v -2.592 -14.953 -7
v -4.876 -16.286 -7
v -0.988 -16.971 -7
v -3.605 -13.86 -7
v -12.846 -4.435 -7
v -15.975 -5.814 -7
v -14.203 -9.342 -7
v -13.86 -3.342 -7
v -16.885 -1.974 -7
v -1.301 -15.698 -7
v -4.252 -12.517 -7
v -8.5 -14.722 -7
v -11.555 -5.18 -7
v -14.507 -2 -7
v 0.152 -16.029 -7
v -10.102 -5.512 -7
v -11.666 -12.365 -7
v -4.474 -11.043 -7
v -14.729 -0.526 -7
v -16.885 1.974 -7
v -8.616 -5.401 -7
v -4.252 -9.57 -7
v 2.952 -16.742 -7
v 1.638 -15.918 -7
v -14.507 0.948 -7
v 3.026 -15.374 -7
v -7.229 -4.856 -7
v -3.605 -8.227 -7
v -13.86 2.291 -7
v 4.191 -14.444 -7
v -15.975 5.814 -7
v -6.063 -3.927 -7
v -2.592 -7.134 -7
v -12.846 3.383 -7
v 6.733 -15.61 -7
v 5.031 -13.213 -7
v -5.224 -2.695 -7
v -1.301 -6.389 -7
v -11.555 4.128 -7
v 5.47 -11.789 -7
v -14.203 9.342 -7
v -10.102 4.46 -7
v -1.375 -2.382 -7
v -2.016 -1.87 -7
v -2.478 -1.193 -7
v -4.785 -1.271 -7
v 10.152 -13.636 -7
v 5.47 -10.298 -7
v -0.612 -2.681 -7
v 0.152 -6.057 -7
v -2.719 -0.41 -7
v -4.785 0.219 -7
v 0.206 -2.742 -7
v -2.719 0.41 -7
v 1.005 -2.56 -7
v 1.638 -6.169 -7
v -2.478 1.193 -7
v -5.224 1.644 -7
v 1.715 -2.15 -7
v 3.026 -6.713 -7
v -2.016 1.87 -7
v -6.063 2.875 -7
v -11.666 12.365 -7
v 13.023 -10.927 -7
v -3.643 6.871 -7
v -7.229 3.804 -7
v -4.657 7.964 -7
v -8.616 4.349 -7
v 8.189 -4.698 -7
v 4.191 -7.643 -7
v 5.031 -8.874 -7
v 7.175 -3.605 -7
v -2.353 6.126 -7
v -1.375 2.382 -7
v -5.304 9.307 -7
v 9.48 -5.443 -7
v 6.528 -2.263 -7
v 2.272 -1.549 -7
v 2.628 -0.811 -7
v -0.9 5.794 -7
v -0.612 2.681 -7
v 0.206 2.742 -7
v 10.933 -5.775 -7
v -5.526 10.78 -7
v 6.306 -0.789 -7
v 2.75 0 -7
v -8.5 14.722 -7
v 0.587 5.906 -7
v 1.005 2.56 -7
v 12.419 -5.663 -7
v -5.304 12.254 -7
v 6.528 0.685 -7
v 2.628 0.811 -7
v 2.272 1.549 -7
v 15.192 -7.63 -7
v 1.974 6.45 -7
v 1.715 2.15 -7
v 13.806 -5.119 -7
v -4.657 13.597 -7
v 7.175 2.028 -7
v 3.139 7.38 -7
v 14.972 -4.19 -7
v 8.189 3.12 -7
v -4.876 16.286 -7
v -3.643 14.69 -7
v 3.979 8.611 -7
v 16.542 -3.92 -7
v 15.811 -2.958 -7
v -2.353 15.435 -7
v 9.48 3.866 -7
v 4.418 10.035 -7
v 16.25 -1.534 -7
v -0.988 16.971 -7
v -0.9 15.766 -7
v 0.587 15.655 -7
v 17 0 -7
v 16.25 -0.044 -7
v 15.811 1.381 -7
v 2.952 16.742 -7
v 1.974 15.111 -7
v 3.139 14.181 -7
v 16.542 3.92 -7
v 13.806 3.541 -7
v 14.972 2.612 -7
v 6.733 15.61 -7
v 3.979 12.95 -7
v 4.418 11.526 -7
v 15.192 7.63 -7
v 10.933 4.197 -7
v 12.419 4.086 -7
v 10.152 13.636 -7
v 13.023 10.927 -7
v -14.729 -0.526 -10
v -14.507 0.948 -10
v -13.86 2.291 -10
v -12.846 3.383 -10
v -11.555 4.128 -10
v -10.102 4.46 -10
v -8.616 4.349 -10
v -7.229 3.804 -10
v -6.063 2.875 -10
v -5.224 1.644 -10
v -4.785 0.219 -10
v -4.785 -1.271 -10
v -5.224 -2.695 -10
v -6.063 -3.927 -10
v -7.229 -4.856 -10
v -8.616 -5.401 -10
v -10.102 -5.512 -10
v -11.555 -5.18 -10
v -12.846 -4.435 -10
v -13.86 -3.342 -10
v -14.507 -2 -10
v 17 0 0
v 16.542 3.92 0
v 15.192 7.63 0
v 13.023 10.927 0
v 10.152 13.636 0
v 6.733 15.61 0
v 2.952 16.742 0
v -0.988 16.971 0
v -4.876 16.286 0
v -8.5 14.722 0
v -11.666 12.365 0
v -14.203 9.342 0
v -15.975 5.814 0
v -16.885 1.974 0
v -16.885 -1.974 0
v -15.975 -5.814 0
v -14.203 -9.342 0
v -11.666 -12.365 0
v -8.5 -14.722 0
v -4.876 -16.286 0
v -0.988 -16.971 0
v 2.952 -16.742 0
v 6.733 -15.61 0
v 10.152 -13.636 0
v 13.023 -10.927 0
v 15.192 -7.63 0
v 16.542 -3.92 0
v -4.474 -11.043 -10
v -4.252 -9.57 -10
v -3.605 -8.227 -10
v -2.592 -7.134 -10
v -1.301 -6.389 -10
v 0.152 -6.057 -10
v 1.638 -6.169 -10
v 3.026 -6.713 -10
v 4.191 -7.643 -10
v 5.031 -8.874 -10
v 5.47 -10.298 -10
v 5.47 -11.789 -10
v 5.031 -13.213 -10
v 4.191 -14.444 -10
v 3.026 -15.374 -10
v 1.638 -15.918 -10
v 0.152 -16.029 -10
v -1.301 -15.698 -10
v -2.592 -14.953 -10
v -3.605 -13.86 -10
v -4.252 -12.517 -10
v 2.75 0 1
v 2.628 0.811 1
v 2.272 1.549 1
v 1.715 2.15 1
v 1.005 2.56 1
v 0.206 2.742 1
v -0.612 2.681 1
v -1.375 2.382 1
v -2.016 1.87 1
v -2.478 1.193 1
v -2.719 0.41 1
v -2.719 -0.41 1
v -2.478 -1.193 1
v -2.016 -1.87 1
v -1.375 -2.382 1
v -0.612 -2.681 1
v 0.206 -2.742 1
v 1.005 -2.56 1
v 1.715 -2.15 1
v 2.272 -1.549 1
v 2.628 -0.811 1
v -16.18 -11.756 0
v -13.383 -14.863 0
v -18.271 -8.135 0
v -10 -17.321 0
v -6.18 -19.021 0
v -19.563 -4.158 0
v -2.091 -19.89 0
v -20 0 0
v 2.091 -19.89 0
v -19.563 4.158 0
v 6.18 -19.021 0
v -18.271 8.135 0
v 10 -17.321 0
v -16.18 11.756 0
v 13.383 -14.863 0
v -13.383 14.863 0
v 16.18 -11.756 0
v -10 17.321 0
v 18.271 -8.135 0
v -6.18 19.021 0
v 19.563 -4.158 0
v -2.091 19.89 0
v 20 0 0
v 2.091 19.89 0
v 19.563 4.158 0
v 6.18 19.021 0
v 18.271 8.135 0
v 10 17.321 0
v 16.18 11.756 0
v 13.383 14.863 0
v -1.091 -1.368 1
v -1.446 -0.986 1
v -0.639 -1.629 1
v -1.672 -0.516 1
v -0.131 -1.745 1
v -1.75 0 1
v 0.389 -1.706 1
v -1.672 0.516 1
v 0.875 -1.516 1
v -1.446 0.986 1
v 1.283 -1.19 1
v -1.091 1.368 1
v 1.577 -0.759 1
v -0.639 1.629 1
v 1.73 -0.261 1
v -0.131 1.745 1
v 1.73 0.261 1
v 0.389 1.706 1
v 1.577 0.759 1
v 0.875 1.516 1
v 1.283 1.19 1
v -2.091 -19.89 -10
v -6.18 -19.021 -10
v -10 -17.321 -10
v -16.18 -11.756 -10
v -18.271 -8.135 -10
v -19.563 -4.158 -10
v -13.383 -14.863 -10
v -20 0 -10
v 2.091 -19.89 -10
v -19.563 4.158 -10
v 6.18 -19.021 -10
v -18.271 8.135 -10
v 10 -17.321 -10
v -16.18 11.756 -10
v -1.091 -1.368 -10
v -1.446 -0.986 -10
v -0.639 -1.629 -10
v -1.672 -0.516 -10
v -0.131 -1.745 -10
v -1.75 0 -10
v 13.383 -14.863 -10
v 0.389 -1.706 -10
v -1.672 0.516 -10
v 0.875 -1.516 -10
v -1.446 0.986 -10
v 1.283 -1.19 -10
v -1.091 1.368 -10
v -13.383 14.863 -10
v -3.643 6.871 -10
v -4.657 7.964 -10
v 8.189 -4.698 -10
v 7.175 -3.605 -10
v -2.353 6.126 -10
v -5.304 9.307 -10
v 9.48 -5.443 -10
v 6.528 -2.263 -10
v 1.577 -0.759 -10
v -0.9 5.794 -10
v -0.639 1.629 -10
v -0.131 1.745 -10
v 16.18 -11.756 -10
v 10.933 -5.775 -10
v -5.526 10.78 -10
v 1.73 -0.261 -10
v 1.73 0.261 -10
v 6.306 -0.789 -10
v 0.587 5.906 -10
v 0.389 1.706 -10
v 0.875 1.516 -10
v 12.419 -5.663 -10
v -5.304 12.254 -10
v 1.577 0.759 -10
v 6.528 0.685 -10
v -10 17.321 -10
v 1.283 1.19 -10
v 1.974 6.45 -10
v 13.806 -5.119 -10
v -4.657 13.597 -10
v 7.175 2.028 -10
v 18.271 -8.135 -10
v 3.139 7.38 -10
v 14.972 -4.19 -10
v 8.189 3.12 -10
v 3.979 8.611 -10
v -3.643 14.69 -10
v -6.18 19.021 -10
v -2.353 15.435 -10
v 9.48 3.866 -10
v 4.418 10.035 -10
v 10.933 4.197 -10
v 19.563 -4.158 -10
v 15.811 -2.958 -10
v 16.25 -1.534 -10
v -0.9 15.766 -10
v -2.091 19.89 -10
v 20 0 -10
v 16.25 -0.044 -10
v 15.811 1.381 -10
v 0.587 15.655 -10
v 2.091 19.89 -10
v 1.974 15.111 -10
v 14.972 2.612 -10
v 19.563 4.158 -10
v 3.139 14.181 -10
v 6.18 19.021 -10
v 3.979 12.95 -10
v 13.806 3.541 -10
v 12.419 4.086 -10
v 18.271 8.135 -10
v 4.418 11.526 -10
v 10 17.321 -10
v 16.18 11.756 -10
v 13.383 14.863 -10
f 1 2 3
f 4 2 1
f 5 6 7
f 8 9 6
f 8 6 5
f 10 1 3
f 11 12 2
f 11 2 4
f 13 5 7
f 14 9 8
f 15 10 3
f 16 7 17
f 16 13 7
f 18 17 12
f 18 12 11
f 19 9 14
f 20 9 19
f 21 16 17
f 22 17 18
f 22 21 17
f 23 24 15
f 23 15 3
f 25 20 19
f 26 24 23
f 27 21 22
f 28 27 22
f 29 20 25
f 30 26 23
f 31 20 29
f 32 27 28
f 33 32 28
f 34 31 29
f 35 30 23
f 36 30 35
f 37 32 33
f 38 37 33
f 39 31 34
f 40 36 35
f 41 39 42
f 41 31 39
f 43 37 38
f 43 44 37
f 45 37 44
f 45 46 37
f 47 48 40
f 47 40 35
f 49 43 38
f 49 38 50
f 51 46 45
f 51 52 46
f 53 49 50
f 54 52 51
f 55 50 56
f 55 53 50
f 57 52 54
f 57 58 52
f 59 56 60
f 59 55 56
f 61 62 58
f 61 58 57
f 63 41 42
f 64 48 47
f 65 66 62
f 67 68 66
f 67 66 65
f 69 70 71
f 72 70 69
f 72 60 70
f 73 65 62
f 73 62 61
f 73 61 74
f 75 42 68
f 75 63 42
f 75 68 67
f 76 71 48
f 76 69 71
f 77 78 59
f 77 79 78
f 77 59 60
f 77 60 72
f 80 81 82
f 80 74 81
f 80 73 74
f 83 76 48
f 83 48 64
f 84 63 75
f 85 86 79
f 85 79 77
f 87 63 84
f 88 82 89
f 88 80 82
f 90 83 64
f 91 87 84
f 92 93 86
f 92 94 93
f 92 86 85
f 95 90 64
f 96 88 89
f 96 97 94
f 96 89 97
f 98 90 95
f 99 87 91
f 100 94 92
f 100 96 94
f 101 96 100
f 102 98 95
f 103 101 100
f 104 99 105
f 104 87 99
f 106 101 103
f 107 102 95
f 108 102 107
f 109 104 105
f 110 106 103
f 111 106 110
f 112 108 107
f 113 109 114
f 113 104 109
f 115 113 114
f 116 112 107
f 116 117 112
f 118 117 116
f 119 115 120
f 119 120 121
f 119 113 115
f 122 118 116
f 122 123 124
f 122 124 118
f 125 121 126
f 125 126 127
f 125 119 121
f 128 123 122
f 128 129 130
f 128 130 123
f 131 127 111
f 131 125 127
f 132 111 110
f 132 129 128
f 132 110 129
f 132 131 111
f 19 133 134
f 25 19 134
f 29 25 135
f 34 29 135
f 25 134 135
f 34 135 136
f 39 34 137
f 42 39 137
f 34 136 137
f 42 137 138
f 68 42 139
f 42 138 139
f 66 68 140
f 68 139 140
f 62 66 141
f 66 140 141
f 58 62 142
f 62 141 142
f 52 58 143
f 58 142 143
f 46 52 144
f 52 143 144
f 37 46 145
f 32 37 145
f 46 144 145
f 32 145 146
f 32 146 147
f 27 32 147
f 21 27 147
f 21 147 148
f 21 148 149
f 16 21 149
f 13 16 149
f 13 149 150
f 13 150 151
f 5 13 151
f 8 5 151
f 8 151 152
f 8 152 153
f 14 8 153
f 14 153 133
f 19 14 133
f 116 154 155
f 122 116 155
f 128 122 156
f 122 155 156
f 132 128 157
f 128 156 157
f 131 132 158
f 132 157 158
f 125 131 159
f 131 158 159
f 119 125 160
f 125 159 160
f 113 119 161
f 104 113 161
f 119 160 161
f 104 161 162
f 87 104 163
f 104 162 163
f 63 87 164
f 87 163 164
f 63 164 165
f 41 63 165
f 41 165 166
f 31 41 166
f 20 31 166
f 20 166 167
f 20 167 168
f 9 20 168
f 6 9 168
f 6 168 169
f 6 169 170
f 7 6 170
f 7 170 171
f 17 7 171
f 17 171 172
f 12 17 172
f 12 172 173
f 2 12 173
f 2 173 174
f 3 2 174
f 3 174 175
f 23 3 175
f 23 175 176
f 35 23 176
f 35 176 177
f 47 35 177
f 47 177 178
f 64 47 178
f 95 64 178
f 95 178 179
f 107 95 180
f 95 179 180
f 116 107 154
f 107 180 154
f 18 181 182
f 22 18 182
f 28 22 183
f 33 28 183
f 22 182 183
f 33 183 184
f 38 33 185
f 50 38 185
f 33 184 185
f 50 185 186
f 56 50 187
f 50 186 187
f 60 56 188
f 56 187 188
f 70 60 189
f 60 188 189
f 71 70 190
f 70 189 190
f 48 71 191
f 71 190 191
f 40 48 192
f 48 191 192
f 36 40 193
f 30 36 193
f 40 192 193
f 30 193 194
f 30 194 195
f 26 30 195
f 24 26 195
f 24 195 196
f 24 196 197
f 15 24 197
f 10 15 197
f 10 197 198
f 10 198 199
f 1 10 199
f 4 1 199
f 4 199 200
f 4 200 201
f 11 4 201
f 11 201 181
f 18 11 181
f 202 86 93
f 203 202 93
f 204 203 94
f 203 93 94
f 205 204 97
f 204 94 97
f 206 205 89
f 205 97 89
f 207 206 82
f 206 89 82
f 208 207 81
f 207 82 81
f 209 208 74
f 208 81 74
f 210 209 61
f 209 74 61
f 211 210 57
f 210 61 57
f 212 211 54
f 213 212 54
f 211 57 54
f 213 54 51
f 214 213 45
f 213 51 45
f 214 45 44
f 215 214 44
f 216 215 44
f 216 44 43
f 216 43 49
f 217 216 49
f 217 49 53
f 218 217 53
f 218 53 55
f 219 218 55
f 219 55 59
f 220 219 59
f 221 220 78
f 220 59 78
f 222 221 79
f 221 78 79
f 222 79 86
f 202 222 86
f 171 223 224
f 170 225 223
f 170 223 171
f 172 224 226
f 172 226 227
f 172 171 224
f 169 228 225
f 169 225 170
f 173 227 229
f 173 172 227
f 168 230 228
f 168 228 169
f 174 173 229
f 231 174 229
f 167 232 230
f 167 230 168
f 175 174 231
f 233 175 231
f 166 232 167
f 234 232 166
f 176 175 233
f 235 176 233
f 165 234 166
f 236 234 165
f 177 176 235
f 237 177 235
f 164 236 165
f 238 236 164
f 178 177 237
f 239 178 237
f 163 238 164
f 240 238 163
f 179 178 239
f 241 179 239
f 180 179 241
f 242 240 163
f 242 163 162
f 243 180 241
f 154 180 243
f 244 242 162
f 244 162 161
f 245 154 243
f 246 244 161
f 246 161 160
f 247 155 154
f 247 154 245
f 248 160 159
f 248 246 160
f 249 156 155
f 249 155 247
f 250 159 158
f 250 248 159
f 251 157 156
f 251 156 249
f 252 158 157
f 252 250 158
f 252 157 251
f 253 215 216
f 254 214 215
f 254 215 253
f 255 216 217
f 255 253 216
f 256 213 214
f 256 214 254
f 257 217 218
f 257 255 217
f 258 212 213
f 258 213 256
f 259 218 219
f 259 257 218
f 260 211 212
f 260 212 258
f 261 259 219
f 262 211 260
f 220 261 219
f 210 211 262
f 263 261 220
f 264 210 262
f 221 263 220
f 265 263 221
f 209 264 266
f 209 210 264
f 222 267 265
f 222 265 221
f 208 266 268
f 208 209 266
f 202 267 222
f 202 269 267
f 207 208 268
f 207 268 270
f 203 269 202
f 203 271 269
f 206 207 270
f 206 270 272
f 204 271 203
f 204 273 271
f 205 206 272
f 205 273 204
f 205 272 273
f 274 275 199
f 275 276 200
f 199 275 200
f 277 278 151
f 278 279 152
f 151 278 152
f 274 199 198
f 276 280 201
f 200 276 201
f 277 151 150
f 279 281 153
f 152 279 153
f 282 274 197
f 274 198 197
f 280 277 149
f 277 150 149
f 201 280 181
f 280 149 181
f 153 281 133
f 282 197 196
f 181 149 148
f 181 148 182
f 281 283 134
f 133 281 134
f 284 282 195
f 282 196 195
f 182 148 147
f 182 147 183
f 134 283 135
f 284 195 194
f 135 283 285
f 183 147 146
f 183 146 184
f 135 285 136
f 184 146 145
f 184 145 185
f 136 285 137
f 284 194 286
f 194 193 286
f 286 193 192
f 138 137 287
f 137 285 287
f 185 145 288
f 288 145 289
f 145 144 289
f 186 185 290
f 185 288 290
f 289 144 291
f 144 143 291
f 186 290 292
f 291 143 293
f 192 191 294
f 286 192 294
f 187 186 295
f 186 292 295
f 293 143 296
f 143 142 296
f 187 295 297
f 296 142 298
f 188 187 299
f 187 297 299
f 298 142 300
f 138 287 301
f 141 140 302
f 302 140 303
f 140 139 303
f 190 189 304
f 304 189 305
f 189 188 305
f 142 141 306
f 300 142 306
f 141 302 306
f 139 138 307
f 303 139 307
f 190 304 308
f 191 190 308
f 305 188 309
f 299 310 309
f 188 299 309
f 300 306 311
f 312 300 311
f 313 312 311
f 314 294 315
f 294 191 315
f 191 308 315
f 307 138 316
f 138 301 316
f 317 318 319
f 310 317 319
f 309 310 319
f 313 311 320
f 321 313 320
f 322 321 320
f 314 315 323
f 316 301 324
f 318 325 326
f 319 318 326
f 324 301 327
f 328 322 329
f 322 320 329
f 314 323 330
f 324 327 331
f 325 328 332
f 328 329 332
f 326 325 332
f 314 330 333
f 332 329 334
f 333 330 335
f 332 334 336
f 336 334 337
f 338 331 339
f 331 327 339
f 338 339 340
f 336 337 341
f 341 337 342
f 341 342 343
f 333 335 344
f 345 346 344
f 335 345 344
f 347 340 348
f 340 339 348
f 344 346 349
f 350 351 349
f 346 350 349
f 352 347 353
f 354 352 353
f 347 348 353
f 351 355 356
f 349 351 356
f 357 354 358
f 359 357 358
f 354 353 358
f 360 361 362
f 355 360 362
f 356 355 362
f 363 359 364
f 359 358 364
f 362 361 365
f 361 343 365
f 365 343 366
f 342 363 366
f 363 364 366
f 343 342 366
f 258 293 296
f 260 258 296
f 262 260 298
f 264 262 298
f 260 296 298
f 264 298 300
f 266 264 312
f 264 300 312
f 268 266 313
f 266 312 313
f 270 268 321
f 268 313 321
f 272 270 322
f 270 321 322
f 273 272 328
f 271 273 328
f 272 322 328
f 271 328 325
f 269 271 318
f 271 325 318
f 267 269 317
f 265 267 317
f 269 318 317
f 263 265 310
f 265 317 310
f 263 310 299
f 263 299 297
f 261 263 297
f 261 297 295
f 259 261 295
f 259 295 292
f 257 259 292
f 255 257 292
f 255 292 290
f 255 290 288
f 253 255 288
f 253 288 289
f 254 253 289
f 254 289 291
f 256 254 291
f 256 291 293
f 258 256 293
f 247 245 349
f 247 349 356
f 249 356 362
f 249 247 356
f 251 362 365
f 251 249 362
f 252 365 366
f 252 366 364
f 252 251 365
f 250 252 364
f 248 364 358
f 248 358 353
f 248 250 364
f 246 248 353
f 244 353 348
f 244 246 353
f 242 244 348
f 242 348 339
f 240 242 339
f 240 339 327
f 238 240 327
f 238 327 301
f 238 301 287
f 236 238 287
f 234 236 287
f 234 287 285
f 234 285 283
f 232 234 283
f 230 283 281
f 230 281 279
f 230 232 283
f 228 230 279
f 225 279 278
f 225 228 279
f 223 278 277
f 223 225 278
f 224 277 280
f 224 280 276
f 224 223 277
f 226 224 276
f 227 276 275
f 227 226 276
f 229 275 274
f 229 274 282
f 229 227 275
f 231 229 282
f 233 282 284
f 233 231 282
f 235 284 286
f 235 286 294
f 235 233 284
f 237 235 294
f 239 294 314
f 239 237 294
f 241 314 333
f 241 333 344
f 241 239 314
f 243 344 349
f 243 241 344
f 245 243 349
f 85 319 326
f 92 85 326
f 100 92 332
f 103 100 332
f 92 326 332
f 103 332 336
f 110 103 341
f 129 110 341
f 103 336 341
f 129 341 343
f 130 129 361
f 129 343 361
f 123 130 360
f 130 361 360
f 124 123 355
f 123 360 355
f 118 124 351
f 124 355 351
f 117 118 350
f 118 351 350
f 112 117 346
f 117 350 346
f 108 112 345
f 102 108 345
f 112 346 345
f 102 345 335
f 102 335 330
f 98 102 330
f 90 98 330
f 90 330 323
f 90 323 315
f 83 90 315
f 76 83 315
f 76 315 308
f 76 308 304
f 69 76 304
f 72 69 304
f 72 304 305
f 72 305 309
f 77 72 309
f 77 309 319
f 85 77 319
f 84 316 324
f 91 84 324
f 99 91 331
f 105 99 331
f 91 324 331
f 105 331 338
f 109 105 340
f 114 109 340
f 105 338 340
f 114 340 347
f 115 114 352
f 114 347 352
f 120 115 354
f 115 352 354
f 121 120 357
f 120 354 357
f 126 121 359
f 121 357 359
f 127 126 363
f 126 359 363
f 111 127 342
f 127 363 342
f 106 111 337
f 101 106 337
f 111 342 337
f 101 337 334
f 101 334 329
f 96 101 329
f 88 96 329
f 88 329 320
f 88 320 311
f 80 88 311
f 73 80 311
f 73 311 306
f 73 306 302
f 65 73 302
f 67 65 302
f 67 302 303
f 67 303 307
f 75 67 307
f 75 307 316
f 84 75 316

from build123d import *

# Parameters (mm, degrees)
F0_R     = 20
F1_DEPTH = 10
F2_T     = -3
F6_R     = 2.75
F7_DEPTH = 8
F9_D     = 3.5
F11_D    = 10
F13_D    = 10
F15_D    = 10
F17_D    = 10


# Not quite as in the source:
# - the program builds the solid bodies; features that only make, move or delete a surface that nothing else refers to are left out


with BuildPart() as f1:
    # F0 (on Top) → F1 (new body)
    with BuildSketch(Plane.XY):
        Circle(F0_R)
    extrude(amount=-F1_DEPTH)

    # F2
    f2_openings = [f1.faces().sort_by_distance(p)[0] for p in [
        (0, 0, 0),
    ]]
    offset(amount=F2_T, openings=f2_openings)

    # F6 (on face) → F7 (join)
    with BuildSketch(Plane.XY.offset(-7)):
        Circle(F6_R)
    extrude(amount=F7_DEPTH)

    # F9 (through all)
    with Locations(Plane.XY.offset(1)):
        with Locations((0, 0)):
            Hole(F9_D / 2)

    # F11 (through all)
    with Locations(Plane.XY):
        with Locations((-0.525876123, 10.7804676518)):
            Hole(F11_D / 2)

    # F13 (through all)
    with Locations(Plane.XY):
        with Locations((-9.7287148237, -0.5258764722)):
            Hole(F13_D / 2)

    # F15 (through all)
    with Locations(Plane.XY):
        with Locations((0.5258767051, -11.0434060916)):
            Hole(F15_D / 2)

    # F17 (through all)
    with Locations(Plane.XY):
        with Locations((11.3063445315, -0.7888147375)):
            Hole(F17_D / 2)


solid = f1.part
